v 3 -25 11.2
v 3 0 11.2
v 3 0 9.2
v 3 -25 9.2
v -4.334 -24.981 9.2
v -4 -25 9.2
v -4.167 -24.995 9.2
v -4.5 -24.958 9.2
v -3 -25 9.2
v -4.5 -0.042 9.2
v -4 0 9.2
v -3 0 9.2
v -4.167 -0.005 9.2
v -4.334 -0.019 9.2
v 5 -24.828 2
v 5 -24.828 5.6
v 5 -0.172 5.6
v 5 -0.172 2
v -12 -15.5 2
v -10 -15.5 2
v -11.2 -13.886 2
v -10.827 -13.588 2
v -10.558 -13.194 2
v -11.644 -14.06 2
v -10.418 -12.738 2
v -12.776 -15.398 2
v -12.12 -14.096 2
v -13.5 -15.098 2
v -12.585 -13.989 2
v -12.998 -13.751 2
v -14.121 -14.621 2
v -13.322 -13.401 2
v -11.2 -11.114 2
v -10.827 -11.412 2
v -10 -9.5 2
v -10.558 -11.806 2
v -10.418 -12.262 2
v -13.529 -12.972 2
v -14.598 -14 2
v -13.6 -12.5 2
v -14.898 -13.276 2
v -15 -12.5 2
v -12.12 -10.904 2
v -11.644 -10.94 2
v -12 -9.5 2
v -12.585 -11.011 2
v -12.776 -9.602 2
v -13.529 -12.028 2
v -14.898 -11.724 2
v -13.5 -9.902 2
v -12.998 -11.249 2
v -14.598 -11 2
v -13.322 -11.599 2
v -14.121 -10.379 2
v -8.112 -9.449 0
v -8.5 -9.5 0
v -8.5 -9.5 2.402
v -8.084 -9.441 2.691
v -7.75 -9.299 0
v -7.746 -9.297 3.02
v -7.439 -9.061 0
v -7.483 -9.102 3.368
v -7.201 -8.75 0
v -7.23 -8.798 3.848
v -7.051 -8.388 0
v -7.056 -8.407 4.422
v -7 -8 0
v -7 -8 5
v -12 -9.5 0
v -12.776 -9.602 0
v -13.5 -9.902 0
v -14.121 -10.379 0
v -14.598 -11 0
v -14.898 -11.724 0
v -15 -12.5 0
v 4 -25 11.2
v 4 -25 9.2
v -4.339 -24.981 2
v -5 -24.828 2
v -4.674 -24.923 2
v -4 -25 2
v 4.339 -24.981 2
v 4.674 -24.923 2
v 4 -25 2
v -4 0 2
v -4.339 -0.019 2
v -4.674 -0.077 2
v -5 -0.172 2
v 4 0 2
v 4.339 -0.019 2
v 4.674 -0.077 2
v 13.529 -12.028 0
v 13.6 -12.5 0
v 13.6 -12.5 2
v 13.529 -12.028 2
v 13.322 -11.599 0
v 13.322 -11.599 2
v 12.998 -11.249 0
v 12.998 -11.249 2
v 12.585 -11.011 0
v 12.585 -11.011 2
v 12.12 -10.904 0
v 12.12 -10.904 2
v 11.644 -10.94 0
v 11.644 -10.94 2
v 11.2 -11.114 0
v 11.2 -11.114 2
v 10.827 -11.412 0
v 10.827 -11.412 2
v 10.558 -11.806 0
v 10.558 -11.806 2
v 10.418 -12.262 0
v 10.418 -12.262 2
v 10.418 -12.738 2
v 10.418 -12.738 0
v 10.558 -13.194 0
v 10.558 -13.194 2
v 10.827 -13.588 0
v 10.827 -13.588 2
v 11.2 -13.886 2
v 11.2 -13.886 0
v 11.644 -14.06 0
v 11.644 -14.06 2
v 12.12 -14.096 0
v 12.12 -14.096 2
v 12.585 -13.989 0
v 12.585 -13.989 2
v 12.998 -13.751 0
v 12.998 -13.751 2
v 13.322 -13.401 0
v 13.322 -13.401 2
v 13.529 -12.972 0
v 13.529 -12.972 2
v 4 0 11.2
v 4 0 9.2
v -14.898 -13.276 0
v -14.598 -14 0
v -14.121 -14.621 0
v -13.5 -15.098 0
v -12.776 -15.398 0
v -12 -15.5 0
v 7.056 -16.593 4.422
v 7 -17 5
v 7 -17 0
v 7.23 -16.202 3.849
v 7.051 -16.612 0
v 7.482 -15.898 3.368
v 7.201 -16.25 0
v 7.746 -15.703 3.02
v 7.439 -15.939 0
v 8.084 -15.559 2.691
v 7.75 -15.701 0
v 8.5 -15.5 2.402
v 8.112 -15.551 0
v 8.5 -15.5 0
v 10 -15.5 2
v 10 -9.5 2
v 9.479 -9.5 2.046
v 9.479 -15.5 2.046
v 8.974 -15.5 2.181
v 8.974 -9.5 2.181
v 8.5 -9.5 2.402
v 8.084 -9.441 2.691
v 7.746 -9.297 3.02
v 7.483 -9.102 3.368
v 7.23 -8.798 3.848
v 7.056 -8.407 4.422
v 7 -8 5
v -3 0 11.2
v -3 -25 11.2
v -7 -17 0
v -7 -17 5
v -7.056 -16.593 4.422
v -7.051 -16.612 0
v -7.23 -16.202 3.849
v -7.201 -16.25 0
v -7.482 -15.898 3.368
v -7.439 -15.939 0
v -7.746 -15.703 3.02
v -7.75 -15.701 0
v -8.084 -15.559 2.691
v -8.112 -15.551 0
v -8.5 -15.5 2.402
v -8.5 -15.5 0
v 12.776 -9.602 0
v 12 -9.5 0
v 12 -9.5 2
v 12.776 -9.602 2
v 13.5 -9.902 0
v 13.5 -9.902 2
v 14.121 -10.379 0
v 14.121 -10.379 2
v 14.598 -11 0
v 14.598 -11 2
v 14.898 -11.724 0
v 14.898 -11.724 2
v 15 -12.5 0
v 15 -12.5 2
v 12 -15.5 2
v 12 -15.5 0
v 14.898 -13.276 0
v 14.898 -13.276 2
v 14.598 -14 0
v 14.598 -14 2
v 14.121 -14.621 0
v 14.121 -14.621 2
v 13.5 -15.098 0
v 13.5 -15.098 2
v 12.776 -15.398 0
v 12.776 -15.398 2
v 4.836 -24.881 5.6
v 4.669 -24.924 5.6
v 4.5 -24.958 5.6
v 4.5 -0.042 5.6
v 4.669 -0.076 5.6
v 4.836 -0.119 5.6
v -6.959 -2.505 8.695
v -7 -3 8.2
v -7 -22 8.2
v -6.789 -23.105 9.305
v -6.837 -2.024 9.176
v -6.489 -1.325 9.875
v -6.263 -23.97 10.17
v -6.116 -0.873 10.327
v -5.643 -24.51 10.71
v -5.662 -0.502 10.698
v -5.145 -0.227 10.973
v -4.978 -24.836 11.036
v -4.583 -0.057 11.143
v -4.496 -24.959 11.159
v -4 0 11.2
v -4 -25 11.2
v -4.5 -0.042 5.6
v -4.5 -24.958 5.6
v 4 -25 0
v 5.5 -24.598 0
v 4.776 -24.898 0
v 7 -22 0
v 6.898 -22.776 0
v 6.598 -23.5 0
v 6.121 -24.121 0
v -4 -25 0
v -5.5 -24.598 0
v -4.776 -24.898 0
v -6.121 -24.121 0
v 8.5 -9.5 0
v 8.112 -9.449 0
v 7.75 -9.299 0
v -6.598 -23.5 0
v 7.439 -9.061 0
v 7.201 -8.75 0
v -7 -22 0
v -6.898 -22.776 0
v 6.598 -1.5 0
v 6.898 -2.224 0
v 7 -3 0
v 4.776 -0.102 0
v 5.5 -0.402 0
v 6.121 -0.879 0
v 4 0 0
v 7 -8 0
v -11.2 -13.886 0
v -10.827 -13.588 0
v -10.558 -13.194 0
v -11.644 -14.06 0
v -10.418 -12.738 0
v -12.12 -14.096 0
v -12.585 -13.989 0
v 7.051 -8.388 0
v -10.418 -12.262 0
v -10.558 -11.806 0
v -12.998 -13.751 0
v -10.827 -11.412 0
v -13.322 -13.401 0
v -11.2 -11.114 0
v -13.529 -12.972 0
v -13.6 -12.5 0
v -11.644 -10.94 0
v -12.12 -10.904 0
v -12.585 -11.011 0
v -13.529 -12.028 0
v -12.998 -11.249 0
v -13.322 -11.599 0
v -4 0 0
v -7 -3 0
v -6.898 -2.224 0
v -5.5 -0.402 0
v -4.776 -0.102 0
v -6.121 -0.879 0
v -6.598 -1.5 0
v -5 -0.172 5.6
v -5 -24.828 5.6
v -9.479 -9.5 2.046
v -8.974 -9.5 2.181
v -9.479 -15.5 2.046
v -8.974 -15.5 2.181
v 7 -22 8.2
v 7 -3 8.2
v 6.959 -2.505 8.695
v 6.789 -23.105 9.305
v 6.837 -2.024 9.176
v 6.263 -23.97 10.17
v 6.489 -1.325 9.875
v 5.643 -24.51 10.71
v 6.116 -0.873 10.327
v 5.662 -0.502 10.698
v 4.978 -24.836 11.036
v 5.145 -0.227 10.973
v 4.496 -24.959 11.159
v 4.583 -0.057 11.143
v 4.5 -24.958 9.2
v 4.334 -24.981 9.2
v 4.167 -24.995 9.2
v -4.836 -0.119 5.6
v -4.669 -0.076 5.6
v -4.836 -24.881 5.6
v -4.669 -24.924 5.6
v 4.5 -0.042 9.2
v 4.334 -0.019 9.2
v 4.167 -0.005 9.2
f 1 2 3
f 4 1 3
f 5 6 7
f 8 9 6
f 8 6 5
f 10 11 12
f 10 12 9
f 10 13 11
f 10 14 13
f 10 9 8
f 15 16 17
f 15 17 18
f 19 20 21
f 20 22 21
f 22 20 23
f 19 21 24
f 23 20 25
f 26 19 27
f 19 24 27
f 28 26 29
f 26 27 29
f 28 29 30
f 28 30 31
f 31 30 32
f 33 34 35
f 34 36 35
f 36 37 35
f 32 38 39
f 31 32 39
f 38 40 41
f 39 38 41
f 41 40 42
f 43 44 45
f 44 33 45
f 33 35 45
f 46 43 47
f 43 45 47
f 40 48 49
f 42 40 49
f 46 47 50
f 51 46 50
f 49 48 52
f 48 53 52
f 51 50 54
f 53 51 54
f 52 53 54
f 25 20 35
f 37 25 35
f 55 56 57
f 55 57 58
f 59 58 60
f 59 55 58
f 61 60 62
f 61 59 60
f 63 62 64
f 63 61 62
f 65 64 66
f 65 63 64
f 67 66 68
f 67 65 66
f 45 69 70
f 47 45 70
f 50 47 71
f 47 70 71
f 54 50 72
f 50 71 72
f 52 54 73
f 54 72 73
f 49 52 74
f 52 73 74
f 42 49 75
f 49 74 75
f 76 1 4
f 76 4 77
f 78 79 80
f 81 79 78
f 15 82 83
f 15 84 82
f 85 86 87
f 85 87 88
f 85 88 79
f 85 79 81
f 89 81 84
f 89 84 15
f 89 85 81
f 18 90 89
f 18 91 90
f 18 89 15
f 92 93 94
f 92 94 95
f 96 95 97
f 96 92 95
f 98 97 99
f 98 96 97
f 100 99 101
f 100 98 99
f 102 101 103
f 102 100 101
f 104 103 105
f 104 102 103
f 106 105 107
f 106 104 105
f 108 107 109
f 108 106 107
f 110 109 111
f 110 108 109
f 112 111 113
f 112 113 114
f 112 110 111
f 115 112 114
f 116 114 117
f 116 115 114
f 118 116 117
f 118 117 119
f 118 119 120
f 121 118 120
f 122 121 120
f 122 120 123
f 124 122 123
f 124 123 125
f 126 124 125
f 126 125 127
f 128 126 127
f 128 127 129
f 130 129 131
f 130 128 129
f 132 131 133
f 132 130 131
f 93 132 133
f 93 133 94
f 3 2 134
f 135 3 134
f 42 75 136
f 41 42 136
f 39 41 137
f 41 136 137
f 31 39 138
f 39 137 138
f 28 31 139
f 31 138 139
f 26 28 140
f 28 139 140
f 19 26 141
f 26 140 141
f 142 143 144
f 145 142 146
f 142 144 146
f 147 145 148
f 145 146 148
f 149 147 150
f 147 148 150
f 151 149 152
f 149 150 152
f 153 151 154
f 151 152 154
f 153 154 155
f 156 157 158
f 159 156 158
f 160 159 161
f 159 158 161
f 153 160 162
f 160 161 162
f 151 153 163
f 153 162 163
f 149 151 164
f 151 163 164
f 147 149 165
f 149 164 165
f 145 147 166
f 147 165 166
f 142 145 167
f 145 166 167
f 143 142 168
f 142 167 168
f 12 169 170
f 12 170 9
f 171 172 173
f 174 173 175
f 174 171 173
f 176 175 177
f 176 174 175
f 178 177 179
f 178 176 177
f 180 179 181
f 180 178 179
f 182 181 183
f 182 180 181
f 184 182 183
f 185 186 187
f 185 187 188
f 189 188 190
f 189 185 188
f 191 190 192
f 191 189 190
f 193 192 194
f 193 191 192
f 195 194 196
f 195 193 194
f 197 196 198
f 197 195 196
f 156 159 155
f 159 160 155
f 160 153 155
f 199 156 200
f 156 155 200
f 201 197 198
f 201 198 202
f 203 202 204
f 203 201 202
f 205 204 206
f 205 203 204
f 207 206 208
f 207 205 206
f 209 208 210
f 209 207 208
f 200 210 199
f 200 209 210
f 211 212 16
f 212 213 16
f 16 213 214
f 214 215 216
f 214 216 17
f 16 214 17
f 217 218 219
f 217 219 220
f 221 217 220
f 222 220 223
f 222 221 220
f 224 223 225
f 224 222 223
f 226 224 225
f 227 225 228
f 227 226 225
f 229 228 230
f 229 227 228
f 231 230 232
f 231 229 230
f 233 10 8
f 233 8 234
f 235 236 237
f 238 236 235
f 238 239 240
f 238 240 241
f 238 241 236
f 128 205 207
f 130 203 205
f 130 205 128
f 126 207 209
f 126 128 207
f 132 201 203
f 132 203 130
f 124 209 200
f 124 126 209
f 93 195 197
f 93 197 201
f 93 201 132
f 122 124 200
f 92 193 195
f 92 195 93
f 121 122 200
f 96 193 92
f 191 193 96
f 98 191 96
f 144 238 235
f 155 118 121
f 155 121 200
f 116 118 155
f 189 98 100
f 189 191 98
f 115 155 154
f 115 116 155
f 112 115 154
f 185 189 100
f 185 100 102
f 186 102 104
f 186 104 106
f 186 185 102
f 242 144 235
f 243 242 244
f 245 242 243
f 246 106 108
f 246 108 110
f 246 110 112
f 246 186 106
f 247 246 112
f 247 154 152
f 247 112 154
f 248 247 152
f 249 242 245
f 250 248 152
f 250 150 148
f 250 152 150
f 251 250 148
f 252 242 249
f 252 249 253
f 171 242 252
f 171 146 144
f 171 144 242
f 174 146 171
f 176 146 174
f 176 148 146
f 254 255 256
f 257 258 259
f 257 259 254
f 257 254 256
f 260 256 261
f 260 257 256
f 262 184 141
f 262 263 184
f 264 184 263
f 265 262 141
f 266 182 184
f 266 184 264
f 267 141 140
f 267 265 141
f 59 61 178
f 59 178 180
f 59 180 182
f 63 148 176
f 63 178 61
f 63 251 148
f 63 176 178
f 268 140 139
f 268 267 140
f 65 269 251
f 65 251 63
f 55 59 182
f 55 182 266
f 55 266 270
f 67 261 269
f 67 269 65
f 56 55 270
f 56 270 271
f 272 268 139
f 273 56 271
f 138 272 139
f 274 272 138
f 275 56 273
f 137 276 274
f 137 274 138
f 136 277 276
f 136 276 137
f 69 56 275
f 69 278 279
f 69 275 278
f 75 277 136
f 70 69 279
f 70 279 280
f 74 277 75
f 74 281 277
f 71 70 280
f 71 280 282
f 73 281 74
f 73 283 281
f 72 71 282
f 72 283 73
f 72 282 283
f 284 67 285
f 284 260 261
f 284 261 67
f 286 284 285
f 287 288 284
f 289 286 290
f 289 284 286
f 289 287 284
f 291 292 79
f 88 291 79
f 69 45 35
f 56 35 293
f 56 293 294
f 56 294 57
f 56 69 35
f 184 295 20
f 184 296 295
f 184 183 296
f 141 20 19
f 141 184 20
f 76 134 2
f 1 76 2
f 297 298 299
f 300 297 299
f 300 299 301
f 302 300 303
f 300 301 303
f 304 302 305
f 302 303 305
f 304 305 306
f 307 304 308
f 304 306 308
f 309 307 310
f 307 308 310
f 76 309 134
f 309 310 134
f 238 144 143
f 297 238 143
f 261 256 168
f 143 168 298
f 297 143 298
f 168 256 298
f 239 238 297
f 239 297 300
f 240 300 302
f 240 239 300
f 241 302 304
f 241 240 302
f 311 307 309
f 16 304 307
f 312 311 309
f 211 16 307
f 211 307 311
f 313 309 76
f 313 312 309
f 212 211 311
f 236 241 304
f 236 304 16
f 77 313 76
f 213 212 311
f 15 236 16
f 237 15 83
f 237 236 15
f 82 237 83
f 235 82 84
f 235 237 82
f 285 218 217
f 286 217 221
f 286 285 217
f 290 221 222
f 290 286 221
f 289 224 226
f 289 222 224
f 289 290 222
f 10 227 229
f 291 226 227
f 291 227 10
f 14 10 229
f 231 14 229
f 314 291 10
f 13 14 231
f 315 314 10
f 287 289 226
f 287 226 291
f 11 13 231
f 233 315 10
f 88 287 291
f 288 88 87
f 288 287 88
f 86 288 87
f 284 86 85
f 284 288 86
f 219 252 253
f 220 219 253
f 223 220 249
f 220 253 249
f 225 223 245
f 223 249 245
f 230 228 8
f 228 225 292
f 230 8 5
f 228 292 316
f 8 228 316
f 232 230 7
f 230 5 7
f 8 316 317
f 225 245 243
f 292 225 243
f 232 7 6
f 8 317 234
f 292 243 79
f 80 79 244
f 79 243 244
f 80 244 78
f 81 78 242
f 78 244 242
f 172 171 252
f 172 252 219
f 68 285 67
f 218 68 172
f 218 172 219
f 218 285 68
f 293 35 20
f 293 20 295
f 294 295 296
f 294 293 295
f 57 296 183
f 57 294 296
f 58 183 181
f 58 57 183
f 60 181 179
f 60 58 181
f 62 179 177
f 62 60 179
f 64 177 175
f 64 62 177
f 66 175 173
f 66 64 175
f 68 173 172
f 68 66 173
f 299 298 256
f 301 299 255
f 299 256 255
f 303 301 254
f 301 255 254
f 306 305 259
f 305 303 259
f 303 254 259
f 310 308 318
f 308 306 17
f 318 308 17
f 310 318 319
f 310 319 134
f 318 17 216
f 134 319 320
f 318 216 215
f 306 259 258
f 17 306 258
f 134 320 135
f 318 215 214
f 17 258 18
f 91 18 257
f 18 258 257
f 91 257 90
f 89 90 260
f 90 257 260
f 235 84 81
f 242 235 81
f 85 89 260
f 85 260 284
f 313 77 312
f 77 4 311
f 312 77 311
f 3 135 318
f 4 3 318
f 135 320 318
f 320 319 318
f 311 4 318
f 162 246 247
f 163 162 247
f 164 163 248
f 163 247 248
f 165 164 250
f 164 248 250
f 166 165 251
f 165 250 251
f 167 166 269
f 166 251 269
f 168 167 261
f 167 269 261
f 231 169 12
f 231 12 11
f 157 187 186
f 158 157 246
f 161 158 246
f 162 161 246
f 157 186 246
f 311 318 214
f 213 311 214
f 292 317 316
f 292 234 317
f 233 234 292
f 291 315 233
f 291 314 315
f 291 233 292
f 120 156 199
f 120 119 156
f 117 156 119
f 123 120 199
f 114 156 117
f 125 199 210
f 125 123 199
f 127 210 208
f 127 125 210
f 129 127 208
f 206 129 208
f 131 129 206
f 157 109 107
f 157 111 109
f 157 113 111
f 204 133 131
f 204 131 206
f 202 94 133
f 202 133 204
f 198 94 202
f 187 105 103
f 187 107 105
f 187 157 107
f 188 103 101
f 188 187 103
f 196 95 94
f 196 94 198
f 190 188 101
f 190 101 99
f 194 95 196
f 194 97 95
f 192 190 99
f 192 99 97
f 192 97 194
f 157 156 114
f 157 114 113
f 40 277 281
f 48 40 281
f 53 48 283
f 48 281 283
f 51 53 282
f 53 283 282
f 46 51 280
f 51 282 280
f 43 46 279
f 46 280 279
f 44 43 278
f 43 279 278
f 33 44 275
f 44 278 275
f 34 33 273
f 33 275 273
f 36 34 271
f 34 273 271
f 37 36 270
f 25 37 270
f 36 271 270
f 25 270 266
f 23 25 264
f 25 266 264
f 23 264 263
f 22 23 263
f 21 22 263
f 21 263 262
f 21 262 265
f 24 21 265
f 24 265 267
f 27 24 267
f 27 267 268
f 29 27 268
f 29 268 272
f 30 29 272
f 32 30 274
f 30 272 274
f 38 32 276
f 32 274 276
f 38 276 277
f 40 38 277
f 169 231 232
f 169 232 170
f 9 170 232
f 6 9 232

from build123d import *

# Parameters (mm, degrees)
F1_DEPTH    = 25
F2_R        = 1.6
F3_DEPTH    = 2
F4_F1_R     = 3
F4_T2_DEPTH = 17
F4_T4_DEPTH = 26.2
F4_T6_DEPTH = 40


# Not quite as in the source:
# - a fillet or chamfer that OpenCascade refuses, or shapes differently, is made with other operations: its cross-section is extruded or revolved along the edge and cut away or added


with BuildPart() as f1:
    # F0 (on Front) → F1 (new body)
    with BuildSketch(Plane.XZ):
        Polygon((0, 2), (0, 0), (7, 0), (7, 11.2), (3, 11.2), (3, 9.2), (4.5, 9.2), (4.5, 5.6), (5, 5.6), (5, 2), align=None)
    extrude(amount=F1_DEPTH)

    # F2 (on Top) → F3 (join)
    with BuildSketch(Plane.XY):
        with BuildLine():
            Line((15, -9.5), (8.5, -9.5))
            ThreePointArc((8.5, -9.5), (7.4393398282, -9.0606601718), (7, -8))
            Line((7, -8), (0, -8))
            Line((0, -8), (0, -9.5))
            Line((0, -9.5), (0, -15.5))
            Line((0, -15.5), (0, -17))
            Line((0, -17), (7, -17))
            ThreePointArc((7, -17), (7.4393398282, -15.9393398282), (8.5, -15.5))
            Line((8.5, -15.5), (15, -15.5))
            Line((15, -15.5), (15, -9.5))
        make_face()
        with Locations((12, -12.5)):
            Circle(F2_R, mode=Mode.SUBTRACT)
    extrude(amount=F3_DEPTH)

    # F4: fillet of radius 3 on 6 edges, made by hand

    # F4_f1
    f4_f1_edges = [f1.edges().sort_by_distance(p)[0] for p in [
        (7, -12.5, 2),
    ]]
    fillet(f4_f1_edges, radius=F4_F1_R)

    # F4_s3 → F4_t2 (cut)
    with BuildSketch(Plane.XY.offset(-7.5)):
        with BuildLine():
            ThreePointArc((15, -12.5), (14.1213203436, -14.6213203436), (12, -15.5))
            Line((12, -15.5), (12, -15.56))
            Line((12, -15.56), (15.06, -15.56))
            Line((15.06, -15.56), (15.06, -12.5))
            Line((15.06, -12.5), (15, -12.5))
        make_face()
        with BuildLine():
            ThreePointArc((12, -9.5), (14.1213203436, -10.3786796564), (15, -12.5))
            Line((15, -12.5), (15.06, -12.5))
            Line((15.06, -12.5), (15.06, -9.44))
            Line((15.06, -9.44), (12, -9.44))
            Line((12, -9.44), (12, -9.5))
        make_face()
    extrude(amount=F4_T2_DEPTH, mode=Mode.SUBTRACT)

    # F4_s5 → F4_t4 (cut)
    with BuildSketch(Plane.XY.offset(-7.5)):
        with BuildLine():
            ThreePointArc((7, -22), (6.1213203436, -24.1213203436), (4, -25))
            Line((4, -25), (4, -25.06))
            Line((4, -25.06), (7.06, -25.06))
            Line((7.06, -25.06), (7.06, -22))
            Line((7.06, -22), (7, -22))
        make_face()
        with BuildLine():
            ThreePointArc((7, -3), (6.1213203436, -0.8786796564), (4, 0))
            Line((4, 0), (4, 0.06))
            Line((4, 0.06), (7.06, 0.06))
            Line((7.06, 0.06), (7.06, -3))
            Line((7.06, -3), (7, -3))
        make_face()
    extrude(amount=F4_T4_DEPTH, mode=Mode.SUBTRACT)

    # F4_s7 → F4_t6 (cut)
    with BuildSketch(Plane.XZ.offset(-7.5)):
        with BuildLine():
            ThreePointArc((7, 8.2), (6.1213203436, 10.3213203436), (4, 11.2))
            Line((4, 11.2), (4, 11.26))
            Line((4, 11.26), (7.06, 11.26))
            Line((7.06, 11.26), (7.06, 8.2))
            Line((7.06, 8.2), (7, 8.2))
        make_face()
    extrude(amount=F4_T6_DEPTH, mode=Mode.SUBTRACT)

    # F5: F1 across face


with BuildPart() as f1_1:
    add(f1.part)
    add(f1.part.mirror(Plane(origin=(0, -12.5, 1), x_dir=(0, -1, 0), z_dir=(-1, 0, 0))))


solid = f1_1.part
